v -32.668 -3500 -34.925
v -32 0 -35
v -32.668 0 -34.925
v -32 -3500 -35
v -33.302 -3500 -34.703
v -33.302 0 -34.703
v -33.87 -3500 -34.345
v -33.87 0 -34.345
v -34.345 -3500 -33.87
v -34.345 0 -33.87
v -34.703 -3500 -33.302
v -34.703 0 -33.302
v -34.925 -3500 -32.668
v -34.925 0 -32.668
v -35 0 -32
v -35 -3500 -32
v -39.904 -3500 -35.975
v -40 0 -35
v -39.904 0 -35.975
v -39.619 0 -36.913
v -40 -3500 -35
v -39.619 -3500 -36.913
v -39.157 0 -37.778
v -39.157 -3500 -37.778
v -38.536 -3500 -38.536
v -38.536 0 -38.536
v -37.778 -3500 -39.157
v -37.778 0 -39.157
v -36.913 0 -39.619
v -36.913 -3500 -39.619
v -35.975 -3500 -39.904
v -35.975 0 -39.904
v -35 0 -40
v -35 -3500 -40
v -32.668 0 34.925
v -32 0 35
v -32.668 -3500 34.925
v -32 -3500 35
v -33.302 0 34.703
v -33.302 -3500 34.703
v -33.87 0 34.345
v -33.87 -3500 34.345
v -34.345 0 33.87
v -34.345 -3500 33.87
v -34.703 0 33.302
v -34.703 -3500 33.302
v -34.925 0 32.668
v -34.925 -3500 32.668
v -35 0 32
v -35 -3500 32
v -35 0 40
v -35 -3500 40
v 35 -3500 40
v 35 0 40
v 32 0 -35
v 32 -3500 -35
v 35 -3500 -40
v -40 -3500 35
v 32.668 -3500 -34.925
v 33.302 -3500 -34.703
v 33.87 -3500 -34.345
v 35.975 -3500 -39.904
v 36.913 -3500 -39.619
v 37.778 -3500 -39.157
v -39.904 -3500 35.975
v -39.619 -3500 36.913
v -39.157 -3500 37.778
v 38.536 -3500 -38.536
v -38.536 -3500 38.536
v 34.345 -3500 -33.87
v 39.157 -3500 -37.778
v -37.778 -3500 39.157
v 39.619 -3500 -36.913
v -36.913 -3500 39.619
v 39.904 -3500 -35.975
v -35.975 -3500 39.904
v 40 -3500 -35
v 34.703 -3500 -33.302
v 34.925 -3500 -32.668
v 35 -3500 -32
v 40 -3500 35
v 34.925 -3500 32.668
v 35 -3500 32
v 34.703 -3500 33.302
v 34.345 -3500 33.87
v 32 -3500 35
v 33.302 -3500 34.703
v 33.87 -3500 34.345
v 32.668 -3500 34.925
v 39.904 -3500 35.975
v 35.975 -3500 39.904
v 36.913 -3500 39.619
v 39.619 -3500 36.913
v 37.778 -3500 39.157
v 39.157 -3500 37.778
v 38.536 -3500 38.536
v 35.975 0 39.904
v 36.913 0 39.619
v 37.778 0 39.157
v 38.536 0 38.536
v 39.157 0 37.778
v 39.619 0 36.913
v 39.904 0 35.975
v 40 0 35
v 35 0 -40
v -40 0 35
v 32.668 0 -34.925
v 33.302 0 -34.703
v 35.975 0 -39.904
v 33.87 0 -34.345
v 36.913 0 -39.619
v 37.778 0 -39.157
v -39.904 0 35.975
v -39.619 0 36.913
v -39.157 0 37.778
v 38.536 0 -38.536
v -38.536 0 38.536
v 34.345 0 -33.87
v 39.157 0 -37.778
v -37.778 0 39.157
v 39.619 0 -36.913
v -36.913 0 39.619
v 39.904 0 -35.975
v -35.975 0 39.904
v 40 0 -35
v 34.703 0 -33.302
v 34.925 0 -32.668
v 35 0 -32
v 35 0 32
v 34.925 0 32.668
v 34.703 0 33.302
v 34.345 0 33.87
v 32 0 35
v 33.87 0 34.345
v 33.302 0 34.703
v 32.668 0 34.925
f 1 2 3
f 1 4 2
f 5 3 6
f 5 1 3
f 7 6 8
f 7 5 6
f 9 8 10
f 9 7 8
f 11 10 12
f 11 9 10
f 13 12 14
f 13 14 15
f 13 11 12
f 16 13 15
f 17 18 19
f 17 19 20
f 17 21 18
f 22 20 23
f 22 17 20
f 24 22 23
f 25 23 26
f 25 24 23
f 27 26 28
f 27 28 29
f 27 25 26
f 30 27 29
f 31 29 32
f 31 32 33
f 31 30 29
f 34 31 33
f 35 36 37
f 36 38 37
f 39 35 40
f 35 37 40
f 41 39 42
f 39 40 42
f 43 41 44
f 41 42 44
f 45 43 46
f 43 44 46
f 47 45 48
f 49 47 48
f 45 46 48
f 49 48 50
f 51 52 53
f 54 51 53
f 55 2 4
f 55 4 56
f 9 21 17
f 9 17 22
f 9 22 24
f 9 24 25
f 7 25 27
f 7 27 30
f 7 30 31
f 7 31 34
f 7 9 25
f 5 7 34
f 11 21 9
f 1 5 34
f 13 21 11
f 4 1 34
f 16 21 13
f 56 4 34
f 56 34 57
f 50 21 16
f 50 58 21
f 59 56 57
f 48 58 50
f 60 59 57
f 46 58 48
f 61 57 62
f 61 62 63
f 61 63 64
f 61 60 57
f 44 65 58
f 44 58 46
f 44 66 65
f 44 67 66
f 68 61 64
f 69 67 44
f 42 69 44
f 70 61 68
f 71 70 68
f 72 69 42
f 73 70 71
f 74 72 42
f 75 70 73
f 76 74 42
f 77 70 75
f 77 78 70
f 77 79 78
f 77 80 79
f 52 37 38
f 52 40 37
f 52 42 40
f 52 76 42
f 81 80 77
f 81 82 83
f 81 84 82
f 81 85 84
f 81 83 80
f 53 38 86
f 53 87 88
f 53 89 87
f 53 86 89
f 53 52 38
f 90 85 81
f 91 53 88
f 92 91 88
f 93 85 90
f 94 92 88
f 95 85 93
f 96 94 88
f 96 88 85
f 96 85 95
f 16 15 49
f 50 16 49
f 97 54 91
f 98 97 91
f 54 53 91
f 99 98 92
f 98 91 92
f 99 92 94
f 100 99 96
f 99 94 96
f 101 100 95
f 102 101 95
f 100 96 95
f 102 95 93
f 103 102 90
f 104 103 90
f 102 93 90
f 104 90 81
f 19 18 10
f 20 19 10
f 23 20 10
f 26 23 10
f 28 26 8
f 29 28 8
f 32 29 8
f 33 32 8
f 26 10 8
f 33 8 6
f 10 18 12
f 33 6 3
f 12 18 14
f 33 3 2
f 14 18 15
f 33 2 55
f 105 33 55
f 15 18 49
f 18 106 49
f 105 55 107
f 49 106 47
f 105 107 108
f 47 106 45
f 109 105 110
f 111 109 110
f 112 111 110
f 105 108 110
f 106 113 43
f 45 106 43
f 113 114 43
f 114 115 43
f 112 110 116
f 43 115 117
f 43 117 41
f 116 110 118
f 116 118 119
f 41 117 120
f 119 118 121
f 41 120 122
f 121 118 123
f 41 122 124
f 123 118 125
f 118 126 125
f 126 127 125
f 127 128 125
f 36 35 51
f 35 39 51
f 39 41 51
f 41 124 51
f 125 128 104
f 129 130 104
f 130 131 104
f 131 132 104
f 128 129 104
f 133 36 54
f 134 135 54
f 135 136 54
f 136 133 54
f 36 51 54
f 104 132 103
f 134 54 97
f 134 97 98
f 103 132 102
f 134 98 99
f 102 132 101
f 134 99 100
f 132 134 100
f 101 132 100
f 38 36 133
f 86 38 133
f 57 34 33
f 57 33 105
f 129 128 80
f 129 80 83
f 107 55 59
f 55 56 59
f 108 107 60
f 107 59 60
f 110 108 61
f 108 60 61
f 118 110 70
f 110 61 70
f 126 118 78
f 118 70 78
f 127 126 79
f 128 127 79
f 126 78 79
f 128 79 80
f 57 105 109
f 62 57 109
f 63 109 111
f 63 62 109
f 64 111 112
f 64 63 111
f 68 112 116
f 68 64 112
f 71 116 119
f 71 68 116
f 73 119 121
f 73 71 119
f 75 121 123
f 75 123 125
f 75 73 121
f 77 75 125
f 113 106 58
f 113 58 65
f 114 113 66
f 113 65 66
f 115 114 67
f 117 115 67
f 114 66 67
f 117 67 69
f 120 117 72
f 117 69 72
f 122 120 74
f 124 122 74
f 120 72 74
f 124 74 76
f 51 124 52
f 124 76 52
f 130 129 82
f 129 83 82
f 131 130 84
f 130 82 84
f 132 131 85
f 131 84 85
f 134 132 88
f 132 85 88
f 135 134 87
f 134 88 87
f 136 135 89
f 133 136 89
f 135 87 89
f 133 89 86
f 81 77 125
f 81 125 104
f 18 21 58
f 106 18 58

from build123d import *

# Parameters (mm, degrees)
F0_W     = 80
F0_H     = 80
F0_W_2   = 70
F0_H_2   = 70
F1_DEPTH = 3500
F2_R     = 3
F3_R     = 5


with BuildPart() as f1:
    # F0 (on Front) → F1 (new body)
    with BuildSketch(Plane.XZ):
        Rectangle(F0_W, F0_H)
        Rectangle(F0_W_2, F0_H_2, mode=Mode.SUBTRACT)
    extrude(amount=F1_DEPTH)

    # F2
    f2_edges = [f1.edges().sort_by_distance(p)[0] for p in [
        (35, -1750, -35),
        (-35, -1750, -35),
        (35, -1750, 35),
        (-35, -1750, 35),
    ]]
    fillet(f2_edges, radius=F2_R)

    # F3
    f3_edges = [f1.edges().sort_by_distance(p)[0] for p in [
        (40, -1750, 40),
        (-40, -1750, 40),
        (-40, -1750, -40),
        (40, -1750, -40),
    ]]
    fillet(f3_edges, radius=F3_R)


solid = f1.part
